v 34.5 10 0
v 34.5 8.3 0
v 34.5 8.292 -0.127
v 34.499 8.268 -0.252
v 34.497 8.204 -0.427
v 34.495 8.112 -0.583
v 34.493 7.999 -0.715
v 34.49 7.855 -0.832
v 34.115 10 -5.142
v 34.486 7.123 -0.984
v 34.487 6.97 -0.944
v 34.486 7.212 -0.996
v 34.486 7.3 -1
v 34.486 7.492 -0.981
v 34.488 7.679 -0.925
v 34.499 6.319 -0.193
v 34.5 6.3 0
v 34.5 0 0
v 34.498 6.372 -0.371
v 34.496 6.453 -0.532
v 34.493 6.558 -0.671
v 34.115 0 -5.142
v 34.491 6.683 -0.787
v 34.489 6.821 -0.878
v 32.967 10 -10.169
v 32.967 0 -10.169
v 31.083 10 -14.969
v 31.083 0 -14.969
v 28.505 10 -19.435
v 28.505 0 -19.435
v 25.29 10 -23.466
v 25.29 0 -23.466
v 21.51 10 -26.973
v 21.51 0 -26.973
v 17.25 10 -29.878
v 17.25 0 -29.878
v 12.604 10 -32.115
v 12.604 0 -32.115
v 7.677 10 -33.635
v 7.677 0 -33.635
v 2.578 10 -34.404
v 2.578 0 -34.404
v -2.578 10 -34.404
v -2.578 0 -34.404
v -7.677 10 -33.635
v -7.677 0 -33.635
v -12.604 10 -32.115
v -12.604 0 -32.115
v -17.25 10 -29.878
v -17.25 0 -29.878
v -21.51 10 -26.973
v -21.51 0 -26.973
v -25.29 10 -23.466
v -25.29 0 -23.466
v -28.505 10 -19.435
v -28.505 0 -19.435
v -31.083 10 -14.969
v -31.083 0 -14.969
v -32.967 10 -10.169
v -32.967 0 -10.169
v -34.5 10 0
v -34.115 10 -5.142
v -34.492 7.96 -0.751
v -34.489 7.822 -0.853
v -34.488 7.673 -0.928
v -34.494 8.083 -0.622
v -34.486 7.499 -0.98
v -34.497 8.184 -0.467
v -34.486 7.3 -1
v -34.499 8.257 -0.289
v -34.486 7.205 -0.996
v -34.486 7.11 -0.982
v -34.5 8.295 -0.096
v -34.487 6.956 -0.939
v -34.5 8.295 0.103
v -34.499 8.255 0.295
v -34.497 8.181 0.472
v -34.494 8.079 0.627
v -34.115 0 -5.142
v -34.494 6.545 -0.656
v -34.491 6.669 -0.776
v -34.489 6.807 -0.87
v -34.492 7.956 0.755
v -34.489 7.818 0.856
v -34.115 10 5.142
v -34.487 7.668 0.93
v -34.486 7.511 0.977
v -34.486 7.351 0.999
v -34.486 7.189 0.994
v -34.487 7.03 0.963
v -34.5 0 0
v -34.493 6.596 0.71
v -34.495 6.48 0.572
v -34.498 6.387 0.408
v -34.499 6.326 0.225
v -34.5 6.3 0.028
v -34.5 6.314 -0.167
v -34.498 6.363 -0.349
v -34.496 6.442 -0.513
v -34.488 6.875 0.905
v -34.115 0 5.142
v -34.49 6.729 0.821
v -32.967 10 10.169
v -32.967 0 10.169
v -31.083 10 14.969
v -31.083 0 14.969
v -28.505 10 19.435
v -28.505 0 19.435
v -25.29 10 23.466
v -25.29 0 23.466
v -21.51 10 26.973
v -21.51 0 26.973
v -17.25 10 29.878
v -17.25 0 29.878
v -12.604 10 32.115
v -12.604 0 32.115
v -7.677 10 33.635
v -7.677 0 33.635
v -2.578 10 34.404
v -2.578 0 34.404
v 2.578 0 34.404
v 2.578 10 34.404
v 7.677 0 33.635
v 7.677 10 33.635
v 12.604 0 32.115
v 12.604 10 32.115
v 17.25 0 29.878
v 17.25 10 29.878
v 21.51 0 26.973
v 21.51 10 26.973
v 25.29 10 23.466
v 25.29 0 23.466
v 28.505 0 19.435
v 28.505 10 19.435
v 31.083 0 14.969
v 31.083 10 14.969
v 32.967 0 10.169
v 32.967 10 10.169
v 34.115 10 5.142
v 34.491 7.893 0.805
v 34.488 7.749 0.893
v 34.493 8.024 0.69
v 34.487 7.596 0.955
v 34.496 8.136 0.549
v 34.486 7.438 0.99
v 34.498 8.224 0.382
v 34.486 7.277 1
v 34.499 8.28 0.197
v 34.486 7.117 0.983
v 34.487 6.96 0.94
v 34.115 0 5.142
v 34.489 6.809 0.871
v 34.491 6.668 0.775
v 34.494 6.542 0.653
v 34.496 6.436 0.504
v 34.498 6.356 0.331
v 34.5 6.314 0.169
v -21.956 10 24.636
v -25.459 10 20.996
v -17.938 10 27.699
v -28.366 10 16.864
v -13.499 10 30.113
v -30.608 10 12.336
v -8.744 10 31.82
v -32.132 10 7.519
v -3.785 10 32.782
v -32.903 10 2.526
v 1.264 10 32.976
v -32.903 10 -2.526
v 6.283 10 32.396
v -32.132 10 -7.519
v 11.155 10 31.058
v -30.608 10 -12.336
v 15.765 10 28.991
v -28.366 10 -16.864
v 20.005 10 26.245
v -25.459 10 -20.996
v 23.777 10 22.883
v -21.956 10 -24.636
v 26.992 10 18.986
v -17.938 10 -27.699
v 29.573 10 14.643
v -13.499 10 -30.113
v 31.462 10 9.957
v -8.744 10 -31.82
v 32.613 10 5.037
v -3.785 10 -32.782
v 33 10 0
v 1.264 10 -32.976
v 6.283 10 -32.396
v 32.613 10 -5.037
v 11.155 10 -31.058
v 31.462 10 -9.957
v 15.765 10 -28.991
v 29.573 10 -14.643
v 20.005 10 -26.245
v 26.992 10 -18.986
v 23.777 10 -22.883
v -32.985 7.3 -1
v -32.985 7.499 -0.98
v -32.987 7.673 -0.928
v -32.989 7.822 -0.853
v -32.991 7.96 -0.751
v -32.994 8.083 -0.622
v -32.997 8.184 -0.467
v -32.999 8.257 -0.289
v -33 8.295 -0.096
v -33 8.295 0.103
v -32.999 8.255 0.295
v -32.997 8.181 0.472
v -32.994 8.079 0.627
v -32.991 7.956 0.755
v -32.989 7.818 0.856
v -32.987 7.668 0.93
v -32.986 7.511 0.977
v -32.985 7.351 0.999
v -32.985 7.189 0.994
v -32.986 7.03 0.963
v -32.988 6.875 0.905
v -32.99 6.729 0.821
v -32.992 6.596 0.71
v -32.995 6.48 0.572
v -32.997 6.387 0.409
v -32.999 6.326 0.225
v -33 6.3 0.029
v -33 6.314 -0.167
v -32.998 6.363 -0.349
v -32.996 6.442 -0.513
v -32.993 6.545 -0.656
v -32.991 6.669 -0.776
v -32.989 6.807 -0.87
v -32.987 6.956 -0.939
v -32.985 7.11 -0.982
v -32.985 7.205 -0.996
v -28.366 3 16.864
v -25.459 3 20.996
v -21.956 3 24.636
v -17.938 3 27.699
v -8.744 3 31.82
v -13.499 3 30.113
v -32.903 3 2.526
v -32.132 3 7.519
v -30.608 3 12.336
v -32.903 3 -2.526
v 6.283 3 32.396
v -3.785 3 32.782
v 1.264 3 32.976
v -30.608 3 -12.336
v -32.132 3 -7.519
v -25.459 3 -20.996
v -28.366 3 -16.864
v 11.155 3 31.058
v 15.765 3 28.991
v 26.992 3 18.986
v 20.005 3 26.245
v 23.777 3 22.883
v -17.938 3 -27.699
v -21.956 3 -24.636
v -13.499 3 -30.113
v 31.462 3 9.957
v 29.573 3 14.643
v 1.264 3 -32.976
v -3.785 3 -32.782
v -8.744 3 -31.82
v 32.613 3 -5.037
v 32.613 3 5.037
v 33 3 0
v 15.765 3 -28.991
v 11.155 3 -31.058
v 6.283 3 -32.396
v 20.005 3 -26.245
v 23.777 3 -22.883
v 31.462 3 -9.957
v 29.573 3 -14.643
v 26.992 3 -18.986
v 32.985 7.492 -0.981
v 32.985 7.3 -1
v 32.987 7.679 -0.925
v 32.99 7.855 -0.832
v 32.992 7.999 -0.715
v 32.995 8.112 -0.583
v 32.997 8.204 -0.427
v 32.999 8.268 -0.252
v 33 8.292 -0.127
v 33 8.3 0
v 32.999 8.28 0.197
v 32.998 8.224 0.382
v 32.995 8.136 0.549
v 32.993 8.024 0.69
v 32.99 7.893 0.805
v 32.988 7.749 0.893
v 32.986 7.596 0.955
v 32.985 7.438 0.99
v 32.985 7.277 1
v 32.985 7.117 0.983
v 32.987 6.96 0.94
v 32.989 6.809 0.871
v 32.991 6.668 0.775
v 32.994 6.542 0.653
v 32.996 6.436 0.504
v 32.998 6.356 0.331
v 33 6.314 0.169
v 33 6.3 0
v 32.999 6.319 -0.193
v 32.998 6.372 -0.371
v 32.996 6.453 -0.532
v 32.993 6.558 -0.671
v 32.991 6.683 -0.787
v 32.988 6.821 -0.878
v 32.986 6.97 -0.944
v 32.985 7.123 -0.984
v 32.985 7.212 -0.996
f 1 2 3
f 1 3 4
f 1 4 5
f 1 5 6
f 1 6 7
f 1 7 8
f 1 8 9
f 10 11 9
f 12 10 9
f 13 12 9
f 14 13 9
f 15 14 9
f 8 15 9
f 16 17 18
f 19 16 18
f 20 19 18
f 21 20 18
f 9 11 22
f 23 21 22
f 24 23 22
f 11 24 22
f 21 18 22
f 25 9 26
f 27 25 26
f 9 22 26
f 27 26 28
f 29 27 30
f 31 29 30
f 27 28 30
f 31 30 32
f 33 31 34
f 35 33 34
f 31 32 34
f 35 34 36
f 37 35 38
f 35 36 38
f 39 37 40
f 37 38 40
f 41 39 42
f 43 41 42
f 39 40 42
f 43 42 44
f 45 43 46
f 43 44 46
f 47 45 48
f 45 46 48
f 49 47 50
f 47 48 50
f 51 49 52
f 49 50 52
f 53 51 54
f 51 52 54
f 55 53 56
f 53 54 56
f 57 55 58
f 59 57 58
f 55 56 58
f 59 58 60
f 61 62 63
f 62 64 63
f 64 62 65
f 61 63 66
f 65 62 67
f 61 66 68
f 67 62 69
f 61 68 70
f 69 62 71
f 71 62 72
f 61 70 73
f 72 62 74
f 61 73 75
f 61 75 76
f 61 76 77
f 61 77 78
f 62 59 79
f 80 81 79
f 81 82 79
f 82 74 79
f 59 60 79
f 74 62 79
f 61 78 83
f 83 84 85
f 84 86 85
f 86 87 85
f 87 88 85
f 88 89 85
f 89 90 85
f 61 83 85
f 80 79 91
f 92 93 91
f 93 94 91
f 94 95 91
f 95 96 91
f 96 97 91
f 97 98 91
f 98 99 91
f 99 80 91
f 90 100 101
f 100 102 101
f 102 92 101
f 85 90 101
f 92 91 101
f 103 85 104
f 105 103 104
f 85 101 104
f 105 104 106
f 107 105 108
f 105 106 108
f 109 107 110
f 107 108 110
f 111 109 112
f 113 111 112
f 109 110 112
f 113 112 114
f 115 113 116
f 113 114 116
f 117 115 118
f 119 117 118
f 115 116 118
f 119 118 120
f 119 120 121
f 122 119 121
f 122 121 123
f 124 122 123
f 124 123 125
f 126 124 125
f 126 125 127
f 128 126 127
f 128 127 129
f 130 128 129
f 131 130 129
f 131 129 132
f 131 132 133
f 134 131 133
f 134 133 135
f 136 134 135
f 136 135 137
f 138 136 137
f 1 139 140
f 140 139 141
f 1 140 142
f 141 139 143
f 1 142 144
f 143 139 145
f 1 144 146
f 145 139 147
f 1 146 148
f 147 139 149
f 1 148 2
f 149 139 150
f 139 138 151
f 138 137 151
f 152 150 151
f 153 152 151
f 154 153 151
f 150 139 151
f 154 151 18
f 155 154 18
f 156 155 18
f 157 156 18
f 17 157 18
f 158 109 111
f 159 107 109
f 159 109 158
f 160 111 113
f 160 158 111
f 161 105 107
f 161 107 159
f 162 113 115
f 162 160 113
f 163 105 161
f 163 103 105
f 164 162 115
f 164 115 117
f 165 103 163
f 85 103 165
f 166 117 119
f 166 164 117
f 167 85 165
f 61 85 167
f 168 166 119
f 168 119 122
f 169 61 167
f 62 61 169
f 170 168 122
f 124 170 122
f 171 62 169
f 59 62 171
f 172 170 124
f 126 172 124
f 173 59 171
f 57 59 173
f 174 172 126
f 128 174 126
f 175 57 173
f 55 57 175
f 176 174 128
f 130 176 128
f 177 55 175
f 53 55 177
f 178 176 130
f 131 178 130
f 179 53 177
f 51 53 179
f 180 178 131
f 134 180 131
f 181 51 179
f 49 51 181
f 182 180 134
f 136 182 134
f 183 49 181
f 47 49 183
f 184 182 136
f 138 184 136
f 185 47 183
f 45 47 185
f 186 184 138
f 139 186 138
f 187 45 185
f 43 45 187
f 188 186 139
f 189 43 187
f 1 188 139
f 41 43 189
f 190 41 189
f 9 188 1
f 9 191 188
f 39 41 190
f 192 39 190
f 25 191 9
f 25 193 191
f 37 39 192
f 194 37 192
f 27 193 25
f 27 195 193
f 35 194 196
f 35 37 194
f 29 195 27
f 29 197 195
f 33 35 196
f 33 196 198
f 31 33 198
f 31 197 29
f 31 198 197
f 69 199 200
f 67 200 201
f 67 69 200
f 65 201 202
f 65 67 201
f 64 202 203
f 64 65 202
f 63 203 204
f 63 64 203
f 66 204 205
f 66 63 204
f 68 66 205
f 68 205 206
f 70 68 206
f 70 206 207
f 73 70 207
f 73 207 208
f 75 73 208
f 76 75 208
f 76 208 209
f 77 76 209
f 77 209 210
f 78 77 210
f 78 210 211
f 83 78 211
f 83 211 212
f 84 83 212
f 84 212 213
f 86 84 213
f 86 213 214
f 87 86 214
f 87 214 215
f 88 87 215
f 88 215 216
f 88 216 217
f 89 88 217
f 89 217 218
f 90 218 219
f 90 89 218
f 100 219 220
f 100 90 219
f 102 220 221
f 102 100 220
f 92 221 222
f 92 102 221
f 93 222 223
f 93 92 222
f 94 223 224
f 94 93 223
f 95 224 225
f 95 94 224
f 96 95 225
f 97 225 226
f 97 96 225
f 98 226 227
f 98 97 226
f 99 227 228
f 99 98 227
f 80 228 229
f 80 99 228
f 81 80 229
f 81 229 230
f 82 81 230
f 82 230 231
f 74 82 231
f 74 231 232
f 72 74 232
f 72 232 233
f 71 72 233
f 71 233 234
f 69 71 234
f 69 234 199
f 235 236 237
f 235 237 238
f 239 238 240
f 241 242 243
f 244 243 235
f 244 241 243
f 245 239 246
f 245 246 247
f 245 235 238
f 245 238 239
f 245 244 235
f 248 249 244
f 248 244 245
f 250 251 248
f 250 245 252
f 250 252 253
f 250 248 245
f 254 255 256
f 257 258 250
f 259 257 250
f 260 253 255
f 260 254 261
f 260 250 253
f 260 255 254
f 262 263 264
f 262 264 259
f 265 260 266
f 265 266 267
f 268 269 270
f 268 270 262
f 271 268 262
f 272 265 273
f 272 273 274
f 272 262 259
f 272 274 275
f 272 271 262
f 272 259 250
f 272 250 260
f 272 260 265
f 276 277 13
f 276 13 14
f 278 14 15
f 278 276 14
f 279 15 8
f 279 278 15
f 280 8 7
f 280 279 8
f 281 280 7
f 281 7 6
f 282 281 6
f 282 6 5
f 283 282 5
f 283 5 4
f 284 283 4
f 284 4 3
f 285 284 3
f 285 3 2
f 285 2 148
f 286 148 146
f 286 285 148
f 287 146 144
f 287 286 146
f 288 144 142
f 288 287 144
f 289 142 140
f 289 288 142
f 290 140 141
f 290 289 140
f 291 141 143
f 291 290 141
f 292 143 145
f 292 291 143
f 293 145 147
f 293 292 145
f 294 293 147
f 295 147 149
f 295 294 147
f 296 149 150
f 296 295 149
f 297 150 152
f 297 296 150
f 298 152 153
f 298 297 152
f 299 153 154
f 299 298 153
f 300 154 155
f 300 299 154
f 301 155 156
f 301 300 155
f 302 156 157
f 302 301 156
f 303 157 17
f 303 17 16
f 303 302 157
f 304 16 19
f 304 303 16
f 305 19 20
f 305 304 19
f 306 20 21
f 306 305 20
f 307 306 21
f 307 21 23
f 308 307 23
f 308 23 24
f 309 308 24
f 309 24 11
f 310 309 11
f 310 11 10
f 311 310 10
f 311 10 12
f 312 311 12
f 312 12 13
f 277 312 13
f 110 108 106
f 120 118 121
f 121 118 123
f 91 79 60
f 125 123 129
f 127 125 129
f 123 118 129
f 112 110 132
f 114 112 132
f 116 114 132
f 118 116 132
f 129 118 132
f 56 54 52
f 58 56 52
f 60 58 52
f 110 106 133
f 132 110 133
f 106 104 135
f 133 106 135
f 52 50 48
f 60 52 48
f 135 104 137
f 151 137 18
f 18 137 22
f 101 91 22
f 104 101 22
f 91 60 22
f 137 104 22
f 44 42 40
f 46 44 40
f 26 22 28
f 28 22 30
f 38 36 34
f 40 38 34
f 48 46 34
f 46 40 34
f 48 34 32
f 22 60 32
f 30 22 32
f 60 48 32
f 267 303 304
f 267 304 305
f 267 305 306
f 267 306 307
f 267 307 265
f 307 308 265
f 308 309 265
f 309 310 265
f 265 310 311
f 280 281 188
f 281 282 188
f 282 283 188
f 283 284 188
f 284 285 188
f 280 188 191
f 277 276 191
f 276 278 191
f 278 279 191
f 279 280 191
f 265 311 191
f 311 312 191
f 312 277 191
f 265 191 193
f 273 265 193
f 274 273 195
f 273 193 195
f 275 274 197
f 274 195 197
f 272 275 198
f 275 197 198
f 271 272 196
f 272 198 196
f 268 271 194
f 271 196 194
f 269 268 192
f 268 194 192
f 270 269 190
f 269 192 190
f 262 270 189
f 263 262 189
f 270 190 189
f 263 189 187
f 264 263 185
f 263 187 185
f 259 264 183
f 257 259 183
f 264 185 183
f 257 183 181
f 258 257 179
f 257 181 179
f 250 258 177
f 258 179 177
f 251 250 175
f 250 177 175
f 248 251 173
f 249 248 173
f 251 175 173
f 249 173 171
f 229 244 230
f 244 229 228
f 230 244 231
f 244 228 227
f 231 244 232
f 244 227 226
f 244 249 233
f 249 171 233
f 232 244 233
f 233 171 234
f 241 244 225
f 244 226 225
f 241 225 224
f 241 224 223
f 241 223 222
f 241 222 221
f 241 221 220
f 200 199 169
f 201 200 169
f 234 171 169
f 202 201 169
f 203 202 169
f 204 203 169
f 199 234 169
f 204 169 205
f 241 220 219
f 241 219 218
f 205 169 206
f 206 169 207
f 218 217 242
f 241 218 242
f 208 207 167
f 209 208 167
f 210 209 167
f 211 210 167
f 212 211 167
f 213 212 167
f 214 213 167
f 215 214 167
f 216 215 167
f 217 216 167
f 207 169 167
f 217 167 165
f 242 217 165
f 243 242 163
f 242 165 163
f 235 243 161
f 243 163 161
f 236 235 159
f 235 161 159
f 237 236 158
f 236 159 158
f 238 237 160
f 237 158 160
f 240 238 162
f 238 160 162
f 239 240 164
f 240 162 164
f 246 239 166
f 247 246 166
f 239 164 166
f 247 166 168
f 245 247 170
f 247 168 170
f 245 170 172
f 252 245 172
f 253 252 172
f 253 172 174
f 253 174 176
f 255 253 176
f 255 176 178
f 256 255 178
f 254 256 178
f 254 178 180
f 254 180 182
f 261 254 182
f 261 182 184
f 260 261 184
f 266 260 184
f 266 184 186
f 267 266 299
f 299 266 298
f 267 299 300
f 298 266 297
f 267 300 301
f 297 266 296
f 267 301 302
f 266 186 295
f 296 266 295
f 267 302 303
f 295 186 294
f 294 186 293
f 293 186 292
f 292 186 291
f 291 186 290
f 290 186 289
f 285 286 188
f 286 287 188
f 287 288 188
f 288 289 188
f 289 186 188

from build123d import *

# Parameters (mm, degrees)
SKETCH1_R               = 34.5
BOSS_EXTRUDE1_DEPTH     = 10
SKETCH2_R               = 33
CUT_EXTRUDE1_DEPTH      = 7
SKETCH3_R               = 1
CUT_EXTRUDE2_DEPTH      = 71.585008529
CUT_EXTRUDE2_DEPTH_BACK = 1


with BuildPart() as part:
    # Sketch1 → Boss-Extrude1 (new body)
    with BuildSketch(Plane(origin=(0, 0, 0), x_dir=(1, 0, 0), z_dir=(0, 1, 0))):
        Circle(SKETCH1_R)
    extrude(amount=BOSS_EXTRUDE1_DEPTH)

    # Sketch2 → Cut-Extrude1 (cut)
    with BuildSketch(Plane(origin=(0, 10, 0), x_dir=(1, 0, 0), z_dir=(0, 1, 0))):
        Circle(SKETCH2_R)
    extrude(amount=-CUT_EXTRUDE1_DEPTH, mode=Mode.SUBTRACT)

    # Sketch3 → Cut-Extrude2 (cut, two sides)
    with BuildSketch(Plane(origin=(-36.085008529, 0, 0), x_dir=(0, 0, -1), z_dir=(1, 0, 0))) as cut_extrude2_sk:
        with Locations((0, 7.3)):
            Circle(SKETCH3_R)
    extrude(amount=CUT_EXTRUDE2_DEPTH, mode=Mode.SUBTRACT)
    extrude(cut_extrude2_sk.sketch, amount=-CUT_EXTRUDE2_DEPTH_BACK, mode=Mode.SUBTRACT)


solid = part.part
